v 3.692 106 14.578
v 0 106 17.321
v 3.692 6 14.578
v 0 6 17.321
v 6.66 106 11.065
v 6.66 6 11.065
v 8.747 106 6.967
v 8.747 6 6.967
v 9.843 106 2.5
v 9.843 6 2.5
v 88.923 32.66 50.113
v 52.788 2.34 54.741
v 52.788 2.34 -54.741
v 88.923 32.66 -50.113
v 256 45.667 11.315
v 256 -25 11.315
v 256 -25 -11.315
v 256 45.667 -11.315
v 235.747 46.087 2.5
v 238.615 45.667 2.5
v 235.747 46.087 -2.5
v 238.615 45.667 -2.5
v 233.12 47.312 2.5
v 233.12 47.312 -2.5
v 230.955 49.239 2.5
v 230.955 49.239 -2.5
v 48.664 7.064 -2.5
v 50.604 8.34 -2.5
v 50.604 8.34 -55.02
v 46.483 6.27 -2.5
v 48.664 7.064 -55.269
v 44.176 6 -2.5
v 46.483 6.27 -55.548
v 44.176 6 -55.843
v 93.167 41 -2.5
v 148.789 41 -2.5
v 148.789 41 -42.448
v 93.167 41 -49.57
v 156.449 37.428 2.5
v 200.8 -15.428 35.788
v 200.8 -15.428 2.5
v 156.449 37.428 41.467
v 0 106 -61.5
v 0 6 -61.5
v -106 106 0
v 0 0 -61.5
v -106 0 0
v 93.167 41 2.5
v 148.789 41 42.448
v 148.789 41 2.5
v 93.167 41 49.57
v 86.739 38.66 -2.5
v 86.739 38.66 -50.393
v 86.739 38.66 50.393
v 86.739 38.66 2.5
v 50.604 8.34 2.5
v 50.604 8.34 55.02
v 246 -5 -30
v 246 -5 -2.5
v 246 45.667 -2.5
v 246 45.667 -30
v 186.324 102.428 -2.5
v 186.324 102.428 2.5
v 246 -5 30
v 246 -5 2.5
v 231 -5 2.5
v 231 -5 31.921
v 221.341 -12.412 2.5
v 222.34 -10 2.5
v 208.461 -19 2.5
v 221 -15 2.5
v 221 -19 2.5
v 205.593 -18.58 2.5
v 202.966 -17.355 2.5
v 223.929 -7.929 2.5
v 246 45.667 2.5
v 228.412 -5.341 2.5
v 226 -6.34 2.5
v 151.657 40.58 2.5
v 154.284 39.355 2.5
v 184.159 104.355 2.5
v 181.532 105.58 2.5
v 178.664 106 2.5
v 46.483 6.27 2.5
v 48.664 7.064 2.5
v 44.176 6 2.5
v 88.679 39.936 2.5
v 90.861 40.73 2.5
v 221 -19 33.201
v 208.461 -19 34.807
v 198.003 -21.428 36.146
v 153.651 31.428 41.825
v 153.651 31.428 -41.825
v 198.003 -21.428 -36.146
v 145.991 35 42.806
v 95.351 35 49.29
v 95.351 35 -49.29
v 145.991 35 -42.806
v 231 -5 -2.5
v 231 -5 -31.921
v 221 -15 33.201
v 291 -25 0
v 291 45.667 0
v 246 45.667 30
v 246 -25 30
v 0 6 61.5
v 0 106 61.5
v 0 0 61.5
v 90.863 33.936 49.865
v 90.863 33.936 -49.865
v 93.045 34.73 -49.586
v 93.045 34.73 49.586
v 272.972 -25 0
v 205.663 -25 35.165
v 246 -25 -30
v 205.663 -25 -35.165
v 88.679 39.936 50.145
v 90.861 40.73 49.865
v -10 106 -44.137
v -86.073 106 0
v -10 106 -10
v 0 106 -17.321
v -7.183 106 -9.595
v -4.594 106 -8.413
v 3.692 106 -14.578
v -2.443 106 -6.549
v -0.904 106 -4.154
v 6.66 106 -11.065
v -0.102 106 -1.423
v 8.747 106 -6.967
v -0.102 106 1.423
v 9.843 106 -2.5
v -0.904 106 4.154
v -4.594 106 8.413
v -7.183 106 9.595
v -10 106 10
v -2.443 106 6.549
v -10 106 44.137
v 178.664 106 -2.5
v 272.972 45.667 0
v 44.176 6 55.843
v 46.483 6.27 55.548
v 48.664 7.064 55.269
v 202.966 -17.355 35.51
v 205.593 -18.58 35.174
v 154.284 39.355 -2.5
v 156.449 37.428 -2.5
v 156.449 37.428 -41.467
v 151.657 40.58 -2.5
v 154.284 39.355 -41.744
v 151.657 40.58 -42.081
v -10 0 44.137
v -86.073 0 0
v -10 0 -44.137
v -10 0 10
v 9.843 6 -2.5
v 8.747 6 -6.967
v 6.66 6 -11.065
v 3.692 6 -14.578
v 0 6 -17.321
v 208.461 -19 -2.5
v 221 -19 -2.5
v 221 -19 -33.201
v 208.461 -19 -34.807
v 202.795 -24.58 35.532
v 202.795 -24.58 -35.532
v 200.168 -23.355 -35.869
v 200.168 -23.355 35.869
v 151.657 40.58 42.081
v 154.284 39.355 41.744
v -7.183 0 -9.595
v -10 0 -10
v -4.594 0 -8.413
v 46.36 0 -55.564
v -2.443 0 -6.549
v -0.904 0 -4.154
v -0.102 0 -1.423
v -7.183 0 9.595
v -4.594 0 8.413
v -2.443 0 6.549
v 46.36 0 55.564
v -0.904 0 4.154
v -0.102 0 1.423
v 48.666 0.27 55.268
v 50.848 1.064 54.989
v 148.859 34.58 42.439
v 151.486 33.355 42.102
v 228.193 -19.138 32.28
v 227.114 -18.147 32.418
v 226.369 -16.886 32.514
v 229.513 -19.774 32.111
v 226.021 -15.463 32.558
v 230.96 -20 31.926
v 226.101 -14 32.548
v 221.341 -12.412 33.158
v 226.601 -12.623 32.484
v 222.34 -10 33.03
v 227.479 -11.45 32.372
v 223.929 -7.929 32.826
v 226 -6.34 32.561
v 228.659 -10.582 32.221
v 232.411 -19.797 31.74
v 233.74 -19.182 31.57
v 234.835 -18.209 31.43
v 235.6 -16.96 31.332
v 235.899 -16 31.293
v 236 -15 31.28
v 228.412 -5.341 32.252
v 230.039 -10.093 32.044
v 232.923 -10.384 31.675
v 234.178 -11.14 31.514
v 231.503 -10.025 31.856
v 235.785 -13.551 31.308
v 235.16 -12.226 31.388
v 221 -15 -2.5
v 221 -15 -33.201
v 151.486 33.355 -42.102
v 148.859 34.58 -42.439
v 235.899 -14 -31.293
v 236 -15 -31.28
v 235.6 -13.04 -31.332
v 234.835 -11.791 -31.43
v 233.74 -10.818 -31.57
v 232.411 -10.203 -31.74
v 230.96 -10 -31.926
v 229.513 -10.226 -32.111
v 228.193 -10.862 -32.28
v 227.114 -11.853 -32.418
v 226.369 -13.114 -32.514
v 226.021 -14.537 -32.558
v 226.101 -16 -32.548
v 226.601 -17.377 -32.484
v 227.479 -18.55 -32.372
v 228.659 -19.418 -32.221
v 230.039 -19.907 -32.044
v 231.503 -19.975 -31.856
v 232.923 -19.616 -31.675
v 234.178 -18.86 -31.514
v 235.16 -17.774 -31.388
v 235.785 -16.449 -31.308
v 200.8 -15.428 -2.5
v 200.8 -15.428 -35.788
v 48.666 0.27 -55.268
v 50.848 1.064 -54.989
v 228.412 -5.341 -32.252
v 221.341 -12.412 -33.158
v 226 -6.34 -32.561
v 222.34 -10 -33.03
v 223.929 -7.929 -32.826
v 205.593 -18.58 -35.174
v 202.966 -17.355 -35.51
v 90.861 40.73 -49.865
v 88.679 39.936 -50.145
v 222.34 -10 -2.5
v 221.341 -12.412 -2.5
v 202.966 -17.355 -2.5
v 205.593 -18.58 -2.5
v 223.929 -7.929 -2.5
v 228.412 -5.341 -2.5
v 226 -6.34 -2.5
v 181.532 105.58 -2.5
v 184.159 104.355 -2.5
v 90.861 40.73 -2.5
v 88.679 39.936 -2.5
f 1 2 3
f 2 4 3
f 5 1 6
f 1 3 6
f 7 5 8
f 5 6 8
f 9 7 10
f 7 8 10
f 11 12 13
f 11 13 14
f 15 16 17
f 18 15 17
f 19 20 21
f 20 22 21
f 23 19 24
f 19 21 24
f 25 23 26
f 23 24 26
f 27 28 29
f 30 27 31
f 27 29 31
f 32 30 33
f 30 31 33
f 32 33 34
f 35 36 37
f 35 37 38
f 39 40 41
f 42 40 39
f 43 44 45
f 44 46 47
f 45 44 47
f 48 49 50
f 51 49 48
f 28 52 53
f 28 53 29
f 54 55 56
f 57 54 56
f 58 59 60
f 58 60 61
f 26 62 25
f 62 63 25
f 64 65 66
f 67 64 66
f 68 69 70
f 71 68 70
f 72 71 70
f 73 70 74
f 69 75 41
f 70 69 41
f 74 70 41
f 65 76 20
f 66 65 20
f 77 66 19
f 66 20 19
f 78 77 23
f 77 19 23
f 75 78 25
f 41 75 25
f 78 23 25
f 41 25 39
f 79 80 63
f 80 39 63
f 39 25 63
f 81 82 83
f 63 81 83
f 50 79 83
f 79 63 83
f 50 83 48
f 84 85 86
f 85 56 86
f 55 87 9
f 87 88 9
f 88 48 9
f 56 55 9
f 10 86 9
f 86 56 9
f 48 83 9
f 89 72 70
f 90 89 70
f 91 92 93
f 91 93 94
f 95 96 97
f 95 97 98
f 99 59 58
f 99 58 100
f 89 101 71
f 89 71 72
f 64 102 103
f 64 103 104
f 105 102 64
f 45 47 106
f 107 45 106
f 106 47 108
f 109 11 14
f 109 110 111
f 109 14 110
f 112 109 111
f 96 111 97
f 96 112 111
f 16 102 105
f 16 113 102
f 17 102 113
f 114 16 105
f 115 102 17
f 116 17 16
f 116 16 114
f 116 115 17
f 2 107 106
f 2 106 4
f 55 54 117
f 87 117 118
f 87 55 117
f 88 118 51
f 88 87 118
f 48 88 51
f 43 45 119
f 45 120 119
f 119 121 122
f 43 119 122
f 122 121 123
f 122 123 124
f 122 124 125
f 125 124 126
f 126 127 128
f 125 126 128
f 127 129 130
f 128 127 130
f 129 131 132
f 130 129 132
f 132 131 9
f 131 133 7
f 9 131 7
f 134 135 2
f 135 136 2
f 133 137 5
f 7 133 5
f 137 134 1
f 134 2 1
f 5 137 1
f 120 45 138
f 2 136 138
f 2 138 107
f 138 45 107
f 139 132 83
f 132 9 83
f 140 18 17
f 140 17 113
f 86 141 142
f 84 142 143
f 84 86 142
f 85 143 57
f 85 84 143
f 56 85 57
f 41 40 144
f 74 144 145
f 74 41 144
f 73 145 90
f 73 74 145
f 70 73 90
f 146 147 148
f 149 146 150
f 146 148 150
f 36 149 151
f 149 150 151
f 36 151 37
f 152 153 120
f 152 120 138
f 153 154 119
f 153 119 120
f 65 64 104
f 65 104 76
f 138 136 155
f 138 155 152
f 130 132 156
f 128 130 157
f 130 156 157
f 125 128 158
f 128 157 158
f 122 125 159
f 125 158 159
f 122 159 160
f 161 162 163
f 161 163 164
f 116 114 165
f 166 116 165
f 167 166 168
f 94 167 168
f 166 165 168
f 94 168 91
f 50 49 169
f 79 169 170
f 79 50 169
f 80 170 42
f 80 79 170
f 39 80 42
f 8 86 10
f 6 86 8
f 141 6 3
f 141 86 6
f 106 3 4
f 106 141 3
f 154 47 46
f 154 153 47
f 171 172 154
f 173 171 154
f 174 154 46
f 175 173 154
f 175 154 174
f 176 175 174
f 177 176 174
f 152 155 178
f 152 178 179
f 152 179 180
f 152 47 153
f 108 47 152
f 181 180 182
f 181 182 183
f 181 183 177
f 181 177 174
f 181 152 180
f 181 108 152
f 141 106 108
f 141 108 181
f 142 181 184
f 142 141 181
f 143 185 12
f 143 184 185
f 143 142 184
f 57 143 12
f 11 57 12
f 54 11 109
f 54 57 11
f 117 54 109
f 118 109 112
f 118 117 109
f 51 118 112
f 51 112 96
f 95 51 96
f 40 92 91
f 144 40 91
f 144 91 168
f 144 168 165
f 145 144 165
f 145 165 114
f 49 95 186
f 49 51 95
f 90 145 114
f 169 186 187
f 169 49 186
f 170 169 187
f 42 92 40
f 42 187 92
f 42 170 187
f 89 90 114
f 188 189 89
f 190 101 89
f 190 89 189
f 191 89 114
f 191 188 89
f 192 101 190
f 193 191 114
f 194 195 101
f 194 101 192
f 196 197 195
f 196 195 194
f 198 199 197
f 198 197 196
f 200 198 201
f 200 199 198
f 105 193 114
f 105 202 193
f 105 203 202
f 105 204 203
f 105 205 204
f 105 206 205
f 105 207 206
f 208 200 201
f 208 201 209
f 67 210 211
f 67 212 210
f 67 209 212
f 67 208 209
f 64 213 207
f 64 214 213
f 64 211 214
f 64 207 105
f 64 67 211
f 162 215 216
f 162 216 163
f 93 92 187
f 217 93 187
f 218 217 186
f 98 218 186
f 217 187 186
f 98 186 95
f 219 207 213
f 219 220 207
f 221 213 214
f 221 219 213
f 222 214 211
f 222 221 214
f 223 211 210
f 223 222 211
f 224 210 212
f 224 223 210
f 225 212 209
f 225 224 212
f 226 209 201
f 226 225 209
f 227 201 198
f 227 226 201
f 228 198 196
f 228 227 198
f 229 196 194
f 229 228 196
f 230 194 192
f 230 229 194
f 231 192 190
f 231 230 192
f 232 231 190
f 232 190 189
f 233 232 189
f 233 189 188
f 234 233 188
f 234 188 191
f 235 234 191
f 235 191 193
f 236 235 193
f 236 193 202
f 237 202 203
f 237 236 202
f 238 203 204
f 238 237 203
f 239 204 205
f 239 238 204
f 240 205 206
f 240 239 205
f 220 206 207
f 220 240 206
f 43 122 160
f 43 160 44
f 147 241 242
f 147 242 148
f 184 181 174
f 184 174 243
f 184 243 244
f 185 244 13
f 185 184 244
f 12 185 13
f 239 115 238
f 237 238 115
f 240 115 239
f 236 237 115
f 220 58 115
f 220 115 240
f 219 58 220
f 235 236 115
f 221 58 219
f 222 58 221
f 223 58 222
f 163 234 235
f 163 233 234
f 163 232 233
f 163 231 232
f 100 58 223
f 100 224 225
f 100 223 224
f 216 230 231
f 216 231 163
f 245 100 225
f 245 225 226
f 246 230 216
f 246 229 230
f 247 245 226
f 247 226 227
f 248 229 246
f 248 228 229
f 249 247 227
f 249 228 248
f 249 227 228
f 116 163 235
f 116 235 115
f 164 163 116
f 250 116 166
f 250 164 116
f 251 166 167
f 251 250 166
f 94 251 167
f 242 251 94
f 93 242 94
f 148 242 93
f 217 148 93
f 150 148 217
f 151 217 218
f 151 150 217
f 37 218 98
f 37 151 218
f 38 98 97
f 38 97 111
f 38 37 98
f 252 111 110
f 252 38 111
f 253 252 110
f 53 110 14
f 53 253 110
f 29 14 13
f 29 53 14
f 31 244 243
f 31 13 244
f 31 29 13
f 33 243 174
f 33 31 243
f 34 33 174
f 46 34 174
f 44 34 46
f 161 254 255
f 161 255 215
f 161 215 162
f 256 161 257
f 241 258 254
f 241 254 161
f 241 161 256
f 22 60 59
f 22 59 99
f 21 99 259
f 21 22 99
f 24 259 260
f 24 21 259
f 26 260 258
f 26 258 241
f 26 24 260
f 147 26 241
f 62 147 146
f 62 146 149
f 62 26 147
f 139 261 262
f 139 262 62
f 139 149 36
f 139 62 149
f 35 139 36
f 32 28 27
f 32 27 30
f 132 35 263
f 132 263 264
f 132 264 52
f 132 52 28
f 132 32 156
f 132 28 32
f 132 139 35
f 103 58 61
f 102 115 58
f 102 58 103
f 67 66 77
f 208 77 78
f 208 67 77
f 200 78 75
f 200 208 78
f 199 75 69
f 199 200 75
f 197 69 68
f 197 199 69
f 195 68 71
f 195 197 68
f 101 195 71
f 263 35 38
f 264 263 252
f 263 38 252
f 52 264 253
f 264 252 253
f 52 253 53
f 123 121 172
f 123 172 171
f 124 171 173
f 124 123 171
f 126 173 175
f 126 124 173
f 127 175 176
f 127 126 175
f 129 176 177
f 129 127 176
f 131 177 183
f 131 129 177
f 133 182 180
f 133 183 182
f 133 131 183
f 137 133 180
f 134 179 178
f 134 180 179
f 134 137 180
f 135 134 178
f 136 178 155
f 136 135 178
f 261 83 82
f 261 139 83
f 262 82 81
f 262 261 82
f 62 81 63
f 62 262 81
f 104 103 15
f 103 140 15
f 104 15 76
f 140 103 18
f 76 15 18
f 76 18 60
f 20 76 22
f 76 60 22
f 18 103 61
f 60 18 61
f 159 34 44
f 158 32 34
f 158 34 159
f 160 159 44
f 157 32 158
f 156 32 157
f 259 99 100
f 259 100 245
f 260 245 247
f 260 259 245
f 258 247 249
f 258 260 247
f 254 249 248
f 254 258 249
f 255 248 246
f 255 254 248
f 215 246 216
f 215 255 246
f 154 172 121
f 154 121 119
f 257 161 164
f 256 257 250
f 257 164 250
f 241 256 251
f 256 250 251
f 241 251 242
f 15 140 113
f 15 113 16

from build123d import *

# Parameters (mm, degrees)
BOSS_EXTRUDE1_DEPTH     = 106
SKETCH3_R               = 5
BOSS_EXTRUDE2_DEPTH     = 61.5
BOSS_EXTRUDE3_START     = -25
BOSS_EXTRUDE3_DEPTH     = 70.666666667
BOSS_EXTRUDE4_DEPTH     = 2.5
FILLET2_R               = 10
CUT_EXTRUDE1_DEPTH      = 107
CUT_EXTRUDE1_DEPTH_BACK = 26
SKETCH7_R               = 20
SKETCH7_R_2             = 10
BOSS_EXTRUDE5_DEPTH     = 106
CUT_EXTRUDE2_DEPTH      = 1
CUT_EXTRUDE2_DEPTH_BACK = 132


with BuildPart() as part:
    # Sketch2 → Boss-Extrude1 (new body)
    with BuildSketch(Plane(origin=(0, 0, 0), x_dir=(1, 0, 0), z_dir=(0, 1, 0))):
        Polygon((0, -61.5), (0, 61.5), (-106, 0), align=None)
        Polygon((-10, 44.136889641), (-86.073338243, 0), (-10, -44.136889641), align=None, mode=Mode.SUBTRACT)
    extrude(amount=BOSS_EXTRUDE1_DEPTH)

    # Sketch3 → Boss-Extrude2 (add, symmetric)
    with BuildSketch(Plane.XY):
        with BuildLine():
            Line((0, 0), (50, 0))
            Line((50, 0), (91.711375741, 35))
            Line((91.711375741, 35), (150.654022129, 35))
            Line((150.654022129, 35), (201, -25))
            Line((201, -25), (246, -25))
            Line((246, -25), (246, -19))
            Line((246, -19), (246, -5))
            Line((246, -5), (231, -5))
            ThreePointArc((231, -5), (223.928932188, -7.928932188), (221, -15))
            Line((221, -15), (221, -19))
            Line((221, -19), (203.797845949, -19))
            Line((203.797845949, -19), (153.451868078, 41))
            Line((153.451868078, 41), (89.527554335, 41))
            Line((89.527554335, 41), (47.816178594, 6))
            Line((47.816178594, 6), (0, 6))
            Line((0, 6), (0, 0))
        make_face()
        with Locations((231, -15)):
            Circle(SKETCH3_R, mode=Mode.SUBTRACT)
    extrude(amount=BOSS_EXTRUDE2_DEPTH, both=True)

    # Sketch4 → Boss-Extrude3 (add)
    with BuildSketch(Plane(origin=(0, 0, 0), x_dir=(1, 0, 0), z_dir=(0, 1, 0)).offset(BOSS_EXTRUDE3_START)):
        Polygon((246, -30), (246, 30), (291, 0), align=None)
        Polygon((256, 11.314829082), (272.972243623, 0), (256, -11.314829082), align=None, mode=Mode.SUBTRACT)
    extrude(amount=BOSS_EXTRUDE3_DEPTH)

    # Sketch5 → Boss-Extrude4 (add, symmetric)
    with BuildSketch(Plane.XY):
        with BuildLine():
            Line((0, 106), (183.326730095, 106))
            Line((183.326730095, 106), (233.952407843, 45.666666667))
            Line((233.952407843, 45.666666667), (246, 45.666666667))
            Line((246, 45.666666667), (246, -5))
            Line((246, -5), (231, -5))
            ThreePointArc((231, -5), (223.928932188, -7.928932188), (221, -15))
            Line((221, -15), (221, -19))
            Line((221, -19), (203.797845949, -19))
            Line((203.797845949, -19), (153.451868078, 41))
            Line((153.451868078, 41), (89.527554335, 41))
            Line((89.527554335, 41), (47.816178594, 6))
            Line((47.816178594, 6), (0, 6))
            Line((0, 6), (0, 106))
        make_face()
    extrude(amount=BOSS_EXTRUDE4_DEPTH, both=True)

    # Fillet2
    fillet2_edges = [part.edges().sort_by_distance(p)[0] for p in [
        (50, 0, 0),
        (91.711375741, 35, 0),
        (150.654022129, 35, 0),
        (201, -25, 0),
        (203.797845949, -19, 32),
        (153.451868078, 41, 32),
        (89.527554335, 41, 32),
        (47.816178594, 6, 32),
        (47.816178594, 6, -32),
        (89.527554335, 41, -32),
        (153.451868078, 41, -32),
        (203.797845949, -19, -32),
        (233.952407843, 45.666666667, 0),
        (183.326730095, 106, 0),
    ]]
    fillet(fillet2_edges, radius=FILLET2_R)

    # Sketch6 → Cut-Extrude1 (cut, two sides)
    with BuildSketch(Plane(origin=(0, 0, 0), x_dir=(1, 0, 0), z_dir=(0, 1, 0))) as cut_extrude1_sk:
        Polygon((0, 61.5), (246, 61.5), (246, 30), align=None)
        Polygon((0, -61.5), (246, -30), (246, -61.5), align=None)
    extrude(amount=CUT_EXTRUDE1_DEPTH, mode=Mode.SUBTRACT)
    extrude(cut_extrude1_sk.sketch, amount=-CUT_EXTRUDE1_DEPTH_BACK, mode=Mode.SUBTRACT)

    # Sketch7 → Boss-Extrude5 (add)
    with BuildSketch(Plane(origin=(0, 0, 0), x_dir=(1, 0, 0), z_dir=(0, 1, 0))):
        with Locations((-10, 0)):
            Circle(SKETCH7_R)
        with Locations((-10, 0)):
            Circle(SKETCH7_R_2, mode=Mode.SUBTRACT)
    extrude(amount=BOSS_EXTRUDE5_DEPTH)

    # Sketch8 → Cut-Extrude2 (cut, two sides)
    with BuildSketch(Plane(origin=(0, 106, 0), x_dir=(1, 0, 0), z_dir=(0, 1, 0))) as cut_extrude2_sk:
        with BuildLine():
            Line((-86.073338243, 0), (-10, 44.136889641))
            Line((-10, 44.136889641), (-10, 10))
            ThreePointArc((-10, 10), (0, 0), (-10, -10))
            Line((-10, -10), (-10, -44.136889641))
            Line((-10, -44.136889641), (-86.073338243, 0))
        make_face()
    extrude(amount=CUT_EXTRUDE2_DEPTH, mode=Mode.SUBTRACT)
    extrude(cut_extrude2_sk.sketch, amount=-CUT_EXTRUDE2_DEPTH_BACK, mode=Mode.SUBTRACT)


solid = part.part
